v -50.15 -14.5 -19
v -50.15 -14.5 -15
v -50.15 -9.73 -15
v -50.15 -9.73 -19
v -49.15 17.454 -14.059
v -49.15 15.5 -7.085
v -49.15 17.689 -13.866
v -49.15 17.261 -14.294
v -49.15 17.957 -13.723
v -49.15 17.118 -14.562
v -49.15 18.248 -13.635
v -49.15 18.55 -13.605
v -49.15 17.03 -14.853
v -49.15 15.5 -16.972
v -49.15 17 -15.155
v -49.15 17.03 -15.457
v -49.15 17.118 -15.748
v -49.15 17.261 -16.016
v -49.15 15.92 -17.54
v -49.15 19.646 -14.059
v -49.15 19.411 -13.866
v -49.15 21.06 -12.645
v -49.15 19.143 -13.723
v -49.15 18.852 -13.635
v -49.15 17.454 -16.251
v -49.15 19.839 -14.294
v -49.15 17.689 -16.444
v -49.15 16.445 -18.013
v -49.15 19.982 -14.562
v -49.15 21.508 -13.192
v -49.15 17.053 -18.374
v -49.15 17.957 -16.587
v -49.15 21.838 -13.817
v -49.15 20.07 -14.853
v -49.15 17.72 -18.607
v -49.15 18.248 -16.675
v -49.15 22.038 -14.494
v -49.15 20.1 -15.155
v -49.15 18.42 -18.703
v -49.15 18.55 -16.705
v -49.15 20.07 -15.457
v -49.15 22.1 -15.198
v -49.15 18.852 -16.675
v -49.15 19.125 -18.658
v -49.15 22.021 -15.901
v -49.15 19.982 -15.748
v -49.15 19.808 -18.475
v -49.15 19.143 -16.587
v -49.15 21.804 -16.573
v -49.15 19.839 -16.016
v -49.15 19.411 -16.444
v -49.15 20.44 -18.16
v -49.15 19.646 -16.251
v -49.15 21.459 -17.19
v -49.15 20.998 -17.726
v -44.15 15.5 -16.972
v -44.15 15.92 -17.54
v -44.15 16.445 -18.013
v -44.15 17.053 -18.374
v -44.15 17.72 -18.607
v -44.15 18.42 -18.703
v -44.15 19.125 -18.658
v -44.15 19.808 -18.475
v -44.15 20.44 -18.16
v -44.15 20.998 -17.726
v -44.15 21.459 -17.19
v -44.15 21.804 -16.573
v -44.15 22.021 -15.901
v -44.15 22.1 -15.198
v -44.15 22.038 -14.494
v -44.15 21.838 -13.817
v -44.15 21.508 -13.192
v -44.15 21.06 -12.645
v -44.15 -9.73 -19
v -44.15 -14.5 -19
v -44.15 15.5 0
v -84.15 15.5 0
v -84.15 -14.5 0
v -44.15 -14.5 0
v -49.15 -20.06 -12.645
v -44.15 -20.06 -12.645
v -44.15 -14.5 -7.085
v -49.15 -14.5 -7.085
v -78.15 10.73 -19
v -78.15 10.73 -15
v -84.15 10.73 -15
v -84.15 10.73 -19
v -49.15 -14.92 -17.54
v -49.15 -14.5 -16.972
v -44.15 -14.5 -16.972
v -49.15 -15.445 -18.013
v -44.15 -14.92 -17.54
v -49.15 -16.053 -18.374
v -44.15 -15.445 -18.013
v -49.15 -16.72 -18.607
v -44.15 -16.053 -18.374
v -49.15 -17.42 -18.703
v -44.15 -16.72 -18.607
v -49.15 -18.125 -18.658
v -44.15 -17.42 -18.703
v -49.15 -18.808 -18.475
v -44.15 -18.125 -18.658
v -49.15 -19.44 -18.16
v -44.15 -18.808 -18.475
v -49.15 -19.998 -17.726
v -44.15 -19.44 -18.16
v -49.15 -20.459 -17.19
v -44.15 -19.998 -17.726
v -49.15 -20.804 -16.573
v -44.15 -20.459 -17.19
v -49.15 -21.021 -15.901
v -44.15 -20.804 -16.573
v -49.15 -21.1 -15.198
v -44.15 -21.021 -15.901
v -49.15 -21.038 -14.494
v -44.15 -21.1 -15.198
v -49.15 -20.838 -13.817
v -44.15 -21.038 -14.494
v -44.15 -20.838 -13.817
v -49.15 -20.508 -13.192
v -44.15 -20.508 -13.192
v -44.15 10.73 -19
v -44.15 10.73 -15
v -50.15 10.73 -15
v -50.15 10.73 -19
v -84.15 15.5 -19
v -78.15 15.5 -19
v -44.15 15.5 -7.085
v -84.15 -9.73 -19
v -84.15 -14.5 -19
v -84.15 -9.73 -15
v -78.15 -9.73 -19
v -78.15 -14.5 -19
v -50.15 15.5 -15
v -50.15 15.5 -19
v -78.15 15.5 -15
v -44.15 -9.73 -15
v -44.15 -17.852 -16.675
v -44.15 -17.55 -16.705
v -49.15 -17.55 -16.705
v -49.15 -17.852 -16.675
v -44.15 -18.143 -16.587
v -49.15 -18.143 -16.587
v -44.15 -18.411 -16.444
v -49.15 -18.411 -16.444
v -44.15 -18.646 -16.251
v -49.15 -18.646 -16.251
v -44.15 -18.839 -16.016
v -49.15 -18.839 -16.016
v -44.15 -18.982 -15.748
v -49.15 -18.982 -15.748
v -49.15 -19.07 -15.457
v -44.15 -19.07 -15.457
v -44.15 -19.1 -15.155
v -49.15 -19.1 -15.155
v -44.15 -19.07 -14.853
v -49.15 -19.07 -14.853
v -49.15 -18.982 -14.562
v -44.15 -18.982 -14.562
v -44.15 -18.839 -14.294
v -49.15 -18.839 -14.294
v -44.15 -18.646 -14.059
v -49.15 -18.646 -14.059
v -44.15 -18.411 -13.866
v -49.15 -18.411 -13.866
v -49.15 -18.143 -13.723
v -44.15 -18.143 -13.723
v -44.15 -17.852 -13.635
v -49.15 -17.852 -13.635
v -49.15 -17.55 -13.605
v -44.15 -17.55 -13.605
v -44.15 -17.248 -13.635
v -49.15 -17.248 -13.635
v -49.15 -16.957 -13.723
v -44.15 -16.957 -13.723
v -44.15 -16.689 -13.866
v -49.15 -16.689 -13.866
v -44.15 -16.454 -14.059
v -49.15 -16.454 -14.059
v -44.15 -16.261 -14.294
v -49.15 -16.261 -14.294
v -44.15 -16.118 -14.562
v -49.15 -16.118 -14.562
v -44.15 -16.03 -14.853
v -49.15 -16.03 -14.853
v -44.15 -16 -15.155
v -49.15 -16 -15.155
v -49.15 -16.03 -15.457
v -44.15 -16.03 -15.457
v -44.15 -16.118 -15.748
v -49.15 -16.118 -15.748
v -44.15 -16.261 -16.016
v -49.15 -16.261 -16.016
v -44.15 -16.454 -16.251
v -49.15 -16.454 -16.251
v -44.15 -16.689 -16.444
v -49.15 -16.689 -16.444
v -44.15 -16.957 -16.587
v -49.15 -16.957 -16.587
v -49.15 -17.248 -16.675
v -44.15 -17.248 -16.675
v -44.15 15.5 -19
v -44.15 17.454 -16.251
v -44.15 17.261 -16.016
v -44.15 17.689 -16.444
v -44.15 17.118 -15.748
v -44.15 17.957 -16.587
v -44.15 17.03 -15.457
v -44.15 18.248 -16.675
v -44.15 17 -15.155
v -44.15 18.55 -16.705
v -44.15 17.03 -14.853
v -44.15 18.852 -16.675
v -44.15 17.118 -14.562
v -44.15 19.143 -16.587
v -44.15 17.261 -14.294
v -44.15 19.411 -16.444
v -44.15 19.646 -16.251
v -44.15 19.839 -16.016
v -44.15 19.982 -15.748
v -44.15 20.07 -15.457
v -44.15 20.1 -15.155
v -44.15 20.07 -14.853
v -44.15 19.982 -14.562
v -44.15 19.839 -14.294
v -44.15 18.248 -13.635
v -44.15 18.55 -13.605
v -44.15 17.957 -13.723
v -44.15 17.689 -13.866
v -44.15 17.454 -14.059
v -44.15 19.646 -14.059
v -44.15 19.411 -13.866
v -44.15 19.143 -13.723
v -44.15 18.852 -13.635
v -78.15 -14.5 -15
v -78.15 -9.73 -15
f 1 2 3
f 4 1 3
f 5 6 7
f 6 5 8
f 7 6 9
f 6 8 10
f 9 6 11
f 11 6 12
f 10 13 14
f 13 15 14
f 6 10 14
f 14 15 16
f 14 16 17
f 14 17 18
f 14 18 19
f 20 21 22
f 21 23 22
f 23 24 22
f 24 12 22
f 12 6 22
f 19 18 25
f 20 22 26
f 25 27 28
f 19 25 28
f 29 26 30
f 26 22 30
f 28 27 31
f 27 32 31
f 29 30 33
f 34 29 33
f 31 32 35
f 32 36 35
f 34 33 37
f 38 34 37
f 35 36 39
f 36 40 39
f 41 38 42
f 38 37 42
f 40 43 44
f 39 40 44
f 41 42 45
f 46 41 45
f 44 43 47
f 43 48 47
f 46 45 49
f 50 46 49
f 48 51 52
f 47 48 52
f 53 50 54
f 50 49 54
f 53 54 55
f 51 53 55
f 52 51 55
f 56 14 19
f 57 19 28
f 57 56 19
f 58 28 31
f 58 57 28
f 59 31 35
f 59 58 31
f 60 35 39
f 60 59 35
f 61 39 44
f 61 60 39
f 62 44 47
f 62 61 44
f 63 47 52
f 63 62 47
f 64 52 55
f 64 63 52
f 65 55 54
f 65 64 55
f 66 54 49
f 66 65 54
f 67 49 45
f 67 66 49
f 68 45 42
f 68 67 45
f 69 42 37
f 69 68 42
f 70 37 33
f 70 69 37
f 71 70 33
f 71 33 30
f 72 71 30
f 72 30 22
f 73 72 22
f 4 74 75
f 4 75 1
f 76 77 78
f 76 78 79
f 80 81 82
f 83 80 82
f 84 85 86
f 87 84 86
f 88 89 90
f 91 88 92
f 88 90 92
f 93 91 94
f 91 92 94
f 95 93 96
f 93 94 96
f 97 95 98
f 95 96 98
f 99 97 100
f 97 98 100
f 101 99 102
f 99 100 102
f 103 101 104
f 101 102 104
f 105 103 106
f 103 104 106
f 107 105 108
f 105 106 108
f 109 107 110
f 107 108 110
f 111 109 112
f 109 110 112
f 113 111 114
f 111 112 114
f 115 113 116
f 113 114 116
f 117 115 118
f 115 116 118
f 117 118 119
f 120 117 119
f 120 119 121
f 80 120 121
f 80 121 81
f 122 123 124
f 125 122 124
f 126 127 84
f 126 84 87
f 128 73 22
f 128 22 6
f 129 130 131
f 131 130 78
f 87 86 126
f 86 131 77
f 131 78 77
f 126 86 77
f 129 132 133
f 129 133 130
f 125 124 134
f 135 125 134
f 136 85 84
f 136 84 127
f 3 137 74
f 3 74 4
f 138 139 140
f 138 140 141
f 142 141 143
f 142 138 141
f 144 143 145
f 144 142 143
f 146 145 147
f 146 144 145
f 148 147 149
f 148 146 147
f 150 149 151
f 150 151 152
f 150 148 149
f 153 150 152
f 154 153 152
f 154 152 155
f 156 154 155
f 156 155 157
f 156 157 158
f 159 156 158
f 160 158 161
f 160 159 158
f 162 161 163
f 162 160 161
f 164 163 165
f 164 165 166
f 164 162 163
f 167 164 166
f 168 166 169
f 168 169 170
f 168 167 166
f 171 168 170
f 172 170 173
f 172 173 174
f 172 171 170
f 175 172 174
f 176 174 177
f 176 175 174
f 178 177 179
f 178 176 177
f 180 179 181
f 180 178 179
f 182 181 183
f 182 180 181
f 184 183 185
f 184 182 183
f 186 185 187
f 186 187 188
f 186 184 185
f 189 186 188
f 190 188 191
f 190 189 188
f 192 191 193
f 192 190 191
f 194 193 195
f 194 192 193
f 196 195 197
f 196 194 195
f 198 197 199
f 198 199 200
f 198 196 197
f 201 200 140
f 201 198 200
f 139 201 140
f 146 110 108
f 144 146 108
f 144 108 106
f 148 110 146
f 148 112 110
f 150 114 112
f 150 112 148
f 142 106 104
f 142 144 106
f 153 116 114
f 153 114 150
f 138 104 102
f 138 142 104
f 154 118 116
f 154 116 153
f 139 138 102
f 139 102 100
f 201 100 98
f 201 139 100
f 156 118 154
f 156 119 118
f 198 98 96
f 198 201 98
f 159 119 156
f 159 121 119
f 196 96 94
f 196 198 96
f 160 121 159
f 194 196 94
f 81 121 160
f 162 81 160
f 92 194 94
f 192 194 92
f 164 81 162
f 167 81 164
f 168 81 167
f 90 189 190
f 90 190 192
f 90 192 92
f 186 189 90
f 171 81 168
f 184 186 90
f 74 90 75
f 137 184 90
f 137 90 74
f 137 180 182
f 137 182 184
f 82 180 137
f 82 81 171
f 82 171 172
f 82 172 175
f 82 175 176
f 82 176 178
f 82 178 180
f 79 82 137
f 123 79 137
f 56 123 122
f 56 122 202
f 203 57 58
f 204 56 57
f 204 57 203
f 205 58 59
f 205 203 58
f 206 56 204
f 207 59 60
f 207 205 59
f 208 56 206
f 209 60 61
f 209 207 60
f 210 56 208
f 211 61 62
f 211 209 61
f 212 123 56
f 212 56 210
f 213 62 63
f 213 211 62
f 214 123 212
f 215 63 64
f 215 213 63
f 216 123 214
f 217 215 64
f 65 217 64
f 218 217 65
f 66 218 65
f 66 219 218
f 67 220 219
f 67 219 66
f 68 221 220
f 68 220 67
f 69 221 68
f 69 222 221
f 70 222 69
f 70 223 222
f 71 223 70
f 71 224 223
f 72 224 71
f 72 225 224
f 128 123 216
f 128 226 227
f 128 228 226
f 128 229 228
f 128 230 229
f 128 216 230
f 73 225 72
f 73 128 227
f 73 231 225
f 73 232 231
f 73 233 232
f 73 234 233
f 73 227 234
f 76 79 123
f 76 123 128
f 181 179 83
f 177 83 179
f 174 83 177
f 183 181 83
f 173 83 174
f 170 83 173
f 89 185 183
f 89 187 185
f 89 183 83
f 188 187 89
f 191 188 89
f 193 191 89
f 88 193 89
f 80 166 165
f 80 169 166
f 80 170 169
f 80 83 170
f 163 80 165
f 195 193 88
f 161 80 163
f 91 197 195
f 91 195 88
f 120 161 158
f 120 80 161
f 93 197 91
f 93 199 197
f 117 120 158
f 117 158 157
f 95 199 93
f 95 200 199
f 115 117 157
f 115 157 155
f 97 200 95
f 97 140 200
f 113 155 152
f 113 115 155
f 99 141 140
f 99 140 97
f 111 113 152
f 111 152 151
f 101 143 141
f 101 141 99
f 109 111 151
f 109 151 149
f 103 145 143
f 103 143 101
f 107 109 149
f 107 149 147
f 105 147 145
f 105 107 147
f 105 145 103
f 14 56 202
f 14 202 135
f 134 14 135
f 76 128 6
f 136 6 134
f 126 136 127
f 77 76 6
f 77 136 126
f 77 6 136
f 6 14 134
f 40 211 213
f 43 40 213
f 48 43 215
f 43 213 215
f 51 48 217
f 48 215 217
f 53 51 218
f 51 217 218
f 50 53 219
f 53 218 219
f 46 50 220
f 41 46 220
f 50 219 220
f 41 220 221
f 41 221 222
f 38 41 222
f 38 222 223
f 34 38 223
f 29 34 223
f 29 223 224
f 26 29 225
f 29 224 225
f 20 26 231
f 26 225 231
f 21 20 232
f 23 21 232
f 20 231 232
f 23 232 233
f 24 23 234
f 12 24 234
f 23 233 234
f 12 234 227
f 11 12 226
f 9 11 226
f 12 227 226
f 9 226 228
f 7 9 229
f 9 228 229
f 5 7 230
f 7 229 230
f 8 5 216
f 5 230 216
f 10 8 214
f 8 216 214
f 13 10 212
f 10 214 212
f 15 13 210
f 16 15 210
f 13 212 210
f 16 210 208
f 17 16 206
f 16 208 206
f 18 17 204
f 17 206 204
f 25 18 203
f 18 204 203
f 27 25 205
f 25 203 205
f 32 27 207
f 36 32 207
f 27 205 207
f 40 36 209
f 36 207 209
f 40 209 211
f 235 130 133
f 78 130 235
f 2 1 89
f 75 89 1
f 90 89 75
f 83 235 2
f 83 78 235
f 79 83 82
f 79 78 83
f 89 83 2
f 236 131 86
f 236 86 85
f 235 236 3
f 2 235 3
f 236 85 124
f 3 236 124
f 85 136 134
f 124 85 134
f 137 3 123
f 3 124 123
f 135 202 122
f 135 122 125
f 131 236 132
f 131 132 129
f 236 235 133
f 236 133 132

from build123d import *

# Parameters (mm, degrees)
SKETCH_1_W      = 40
SKETCH_1_H      = 30
EXTRUDE_1_DEPTH = 15
SKETCH_3_R      = 1.55
EXTRUDE_2_DEPTH = 5
SKETCH_4_W      = 6
SKETCH_4_H      = 4.77
EXTRUDE_3_DEPTH = 4


with BuildPart() as part:
    # 草图1 → 凸台-拉伸1 (new body)
    with BuildSketch(Plane.XY):
        with Locations((-64.15, 0.5)):
            Rectangle(SKETCH_1_W, SKETCH_1_H)
    extrude(amount=-EXTRUDE_1_DEPTH)

    # 草图3 → 凸台-拉伸2 (add)
    with BuildSketch(Plane(origin=(-44.15, 0, 0), x_dir=(0, 0, -1), z_dir=(1, 0, 0))):
        with BuildLine():
            Line((7.084541854, 15.5), (15, 15.5))
            Line((15, 15.5), (15, 15.003385417))
            ThreePointArc((15, 15.003385417), (18.463655357, 19.83658452), (12.644770927, 21.060229073))
            Line((12.644770927, 21.060229073), (7.084541854, 15.5))
        make_face()
        with Locations((15.155, 18.55)):
            Circle(SKETCH_3_R, mode=Mode.SUBTRACT)
    extrude_2 = extrude(amount=-EXTRUDE_2_DEPTH)

    # 镜向2: 凸台-拉伸2 across plane
    add(extrude_2.mirror(Plane.ZX.offset(0.5)))

    # 草图4 → 凸台-拉伸3 (add)
    with BuildSketch(Plane(origin=(0, 0, -15), x_dir=(-1, 0, 0), z_dir=(0, 0, -1))):
        with Locations((47.15, 13.115)):
            Rectangle(SKETCH_4_W, SKETCH_4_H)
        with Locations((81.15, 13.115)):
            Rectangle(SKETCH_4_W, SKETCH_4_H)
        with Locations((81.15, -12.115)):
            Rectangle(SKETCH_4_W, SKETCH_4_H)
        with Locations((47.15, -12.115)):
            Rectangle(SKETCH_4_W, SKETCH_4_H)
    extrude(amount=EXTRUDE_3_DEPTH)


solid = part.part
